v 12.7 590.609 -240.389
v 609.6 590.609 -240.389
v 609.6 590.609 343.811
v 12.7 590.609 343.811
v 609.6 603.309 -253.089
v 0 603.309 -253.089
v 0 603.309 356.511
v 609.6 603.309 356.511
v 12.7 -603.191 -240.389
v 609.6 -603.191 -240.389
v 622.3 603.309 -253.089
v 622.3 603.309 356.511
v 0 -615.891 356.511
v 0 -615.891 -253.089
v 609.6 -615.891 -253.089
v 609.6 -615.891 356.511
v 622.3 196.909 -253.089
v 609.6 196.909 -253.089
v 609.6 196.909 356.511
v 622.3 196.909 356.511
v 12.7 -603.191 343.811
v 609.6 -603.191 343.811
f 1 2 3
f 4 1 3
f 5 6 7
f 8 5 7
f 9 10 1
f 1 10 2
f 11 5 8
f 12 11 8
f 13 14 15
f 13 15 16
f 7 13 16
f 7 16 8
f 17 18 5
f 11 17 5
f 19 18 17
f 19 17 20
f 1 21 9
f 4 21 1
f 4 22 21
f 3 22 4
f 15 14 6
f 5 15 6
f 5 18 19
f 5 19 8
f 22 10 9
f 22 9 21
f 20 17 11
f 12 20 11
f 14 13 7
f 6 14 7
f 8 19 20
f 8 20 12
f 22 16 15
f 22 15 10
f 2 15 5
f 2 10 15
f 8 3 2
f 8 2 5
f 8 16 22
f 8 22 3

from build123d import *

# Parameters (mm, degrees)
F0_W     = 1219.2
F0_H     = 609.6
F1_DEPTH = 609.6
F2_W     = 1193.8
F2_H     = 584.2
F3_DEPTH = 596.9
F4_W     = 406.4
F4_H     = 609.6
F5_DEPTH = 12.7


with BuildPart() as f1:
    # F0 (on Right) → F1 (new body)
    with BuildSketch(Plane.YZ):
        with Locations((-6.29086, 51.711194)):
            Rectangle(F0_W, F0_H)
    extrude(amount=F1_DEPTH)

    # F2 (on face) → F3 (cut)
    with BuildSketch(Plane.YZ.offset(609.6)):
        with Locations((-6.29086, 51.711194)):
            Rectangle(F2_W, F2_H)
    extrude(amount=-F3_DEPTH, mode=Mode.SUBTRACT)


with BuildPart() as f5:
    # F4 (on face) → F5 (new body)
    with BuildSketch(Plane.YZ.offset(609.6)):
        with Locations((400.10914, 51.711194)):
            Rectangle(F4_W, F4_H)
    extrude(amount=F5_DEPTH)


solid = Compound([f1.part, f5.part])
